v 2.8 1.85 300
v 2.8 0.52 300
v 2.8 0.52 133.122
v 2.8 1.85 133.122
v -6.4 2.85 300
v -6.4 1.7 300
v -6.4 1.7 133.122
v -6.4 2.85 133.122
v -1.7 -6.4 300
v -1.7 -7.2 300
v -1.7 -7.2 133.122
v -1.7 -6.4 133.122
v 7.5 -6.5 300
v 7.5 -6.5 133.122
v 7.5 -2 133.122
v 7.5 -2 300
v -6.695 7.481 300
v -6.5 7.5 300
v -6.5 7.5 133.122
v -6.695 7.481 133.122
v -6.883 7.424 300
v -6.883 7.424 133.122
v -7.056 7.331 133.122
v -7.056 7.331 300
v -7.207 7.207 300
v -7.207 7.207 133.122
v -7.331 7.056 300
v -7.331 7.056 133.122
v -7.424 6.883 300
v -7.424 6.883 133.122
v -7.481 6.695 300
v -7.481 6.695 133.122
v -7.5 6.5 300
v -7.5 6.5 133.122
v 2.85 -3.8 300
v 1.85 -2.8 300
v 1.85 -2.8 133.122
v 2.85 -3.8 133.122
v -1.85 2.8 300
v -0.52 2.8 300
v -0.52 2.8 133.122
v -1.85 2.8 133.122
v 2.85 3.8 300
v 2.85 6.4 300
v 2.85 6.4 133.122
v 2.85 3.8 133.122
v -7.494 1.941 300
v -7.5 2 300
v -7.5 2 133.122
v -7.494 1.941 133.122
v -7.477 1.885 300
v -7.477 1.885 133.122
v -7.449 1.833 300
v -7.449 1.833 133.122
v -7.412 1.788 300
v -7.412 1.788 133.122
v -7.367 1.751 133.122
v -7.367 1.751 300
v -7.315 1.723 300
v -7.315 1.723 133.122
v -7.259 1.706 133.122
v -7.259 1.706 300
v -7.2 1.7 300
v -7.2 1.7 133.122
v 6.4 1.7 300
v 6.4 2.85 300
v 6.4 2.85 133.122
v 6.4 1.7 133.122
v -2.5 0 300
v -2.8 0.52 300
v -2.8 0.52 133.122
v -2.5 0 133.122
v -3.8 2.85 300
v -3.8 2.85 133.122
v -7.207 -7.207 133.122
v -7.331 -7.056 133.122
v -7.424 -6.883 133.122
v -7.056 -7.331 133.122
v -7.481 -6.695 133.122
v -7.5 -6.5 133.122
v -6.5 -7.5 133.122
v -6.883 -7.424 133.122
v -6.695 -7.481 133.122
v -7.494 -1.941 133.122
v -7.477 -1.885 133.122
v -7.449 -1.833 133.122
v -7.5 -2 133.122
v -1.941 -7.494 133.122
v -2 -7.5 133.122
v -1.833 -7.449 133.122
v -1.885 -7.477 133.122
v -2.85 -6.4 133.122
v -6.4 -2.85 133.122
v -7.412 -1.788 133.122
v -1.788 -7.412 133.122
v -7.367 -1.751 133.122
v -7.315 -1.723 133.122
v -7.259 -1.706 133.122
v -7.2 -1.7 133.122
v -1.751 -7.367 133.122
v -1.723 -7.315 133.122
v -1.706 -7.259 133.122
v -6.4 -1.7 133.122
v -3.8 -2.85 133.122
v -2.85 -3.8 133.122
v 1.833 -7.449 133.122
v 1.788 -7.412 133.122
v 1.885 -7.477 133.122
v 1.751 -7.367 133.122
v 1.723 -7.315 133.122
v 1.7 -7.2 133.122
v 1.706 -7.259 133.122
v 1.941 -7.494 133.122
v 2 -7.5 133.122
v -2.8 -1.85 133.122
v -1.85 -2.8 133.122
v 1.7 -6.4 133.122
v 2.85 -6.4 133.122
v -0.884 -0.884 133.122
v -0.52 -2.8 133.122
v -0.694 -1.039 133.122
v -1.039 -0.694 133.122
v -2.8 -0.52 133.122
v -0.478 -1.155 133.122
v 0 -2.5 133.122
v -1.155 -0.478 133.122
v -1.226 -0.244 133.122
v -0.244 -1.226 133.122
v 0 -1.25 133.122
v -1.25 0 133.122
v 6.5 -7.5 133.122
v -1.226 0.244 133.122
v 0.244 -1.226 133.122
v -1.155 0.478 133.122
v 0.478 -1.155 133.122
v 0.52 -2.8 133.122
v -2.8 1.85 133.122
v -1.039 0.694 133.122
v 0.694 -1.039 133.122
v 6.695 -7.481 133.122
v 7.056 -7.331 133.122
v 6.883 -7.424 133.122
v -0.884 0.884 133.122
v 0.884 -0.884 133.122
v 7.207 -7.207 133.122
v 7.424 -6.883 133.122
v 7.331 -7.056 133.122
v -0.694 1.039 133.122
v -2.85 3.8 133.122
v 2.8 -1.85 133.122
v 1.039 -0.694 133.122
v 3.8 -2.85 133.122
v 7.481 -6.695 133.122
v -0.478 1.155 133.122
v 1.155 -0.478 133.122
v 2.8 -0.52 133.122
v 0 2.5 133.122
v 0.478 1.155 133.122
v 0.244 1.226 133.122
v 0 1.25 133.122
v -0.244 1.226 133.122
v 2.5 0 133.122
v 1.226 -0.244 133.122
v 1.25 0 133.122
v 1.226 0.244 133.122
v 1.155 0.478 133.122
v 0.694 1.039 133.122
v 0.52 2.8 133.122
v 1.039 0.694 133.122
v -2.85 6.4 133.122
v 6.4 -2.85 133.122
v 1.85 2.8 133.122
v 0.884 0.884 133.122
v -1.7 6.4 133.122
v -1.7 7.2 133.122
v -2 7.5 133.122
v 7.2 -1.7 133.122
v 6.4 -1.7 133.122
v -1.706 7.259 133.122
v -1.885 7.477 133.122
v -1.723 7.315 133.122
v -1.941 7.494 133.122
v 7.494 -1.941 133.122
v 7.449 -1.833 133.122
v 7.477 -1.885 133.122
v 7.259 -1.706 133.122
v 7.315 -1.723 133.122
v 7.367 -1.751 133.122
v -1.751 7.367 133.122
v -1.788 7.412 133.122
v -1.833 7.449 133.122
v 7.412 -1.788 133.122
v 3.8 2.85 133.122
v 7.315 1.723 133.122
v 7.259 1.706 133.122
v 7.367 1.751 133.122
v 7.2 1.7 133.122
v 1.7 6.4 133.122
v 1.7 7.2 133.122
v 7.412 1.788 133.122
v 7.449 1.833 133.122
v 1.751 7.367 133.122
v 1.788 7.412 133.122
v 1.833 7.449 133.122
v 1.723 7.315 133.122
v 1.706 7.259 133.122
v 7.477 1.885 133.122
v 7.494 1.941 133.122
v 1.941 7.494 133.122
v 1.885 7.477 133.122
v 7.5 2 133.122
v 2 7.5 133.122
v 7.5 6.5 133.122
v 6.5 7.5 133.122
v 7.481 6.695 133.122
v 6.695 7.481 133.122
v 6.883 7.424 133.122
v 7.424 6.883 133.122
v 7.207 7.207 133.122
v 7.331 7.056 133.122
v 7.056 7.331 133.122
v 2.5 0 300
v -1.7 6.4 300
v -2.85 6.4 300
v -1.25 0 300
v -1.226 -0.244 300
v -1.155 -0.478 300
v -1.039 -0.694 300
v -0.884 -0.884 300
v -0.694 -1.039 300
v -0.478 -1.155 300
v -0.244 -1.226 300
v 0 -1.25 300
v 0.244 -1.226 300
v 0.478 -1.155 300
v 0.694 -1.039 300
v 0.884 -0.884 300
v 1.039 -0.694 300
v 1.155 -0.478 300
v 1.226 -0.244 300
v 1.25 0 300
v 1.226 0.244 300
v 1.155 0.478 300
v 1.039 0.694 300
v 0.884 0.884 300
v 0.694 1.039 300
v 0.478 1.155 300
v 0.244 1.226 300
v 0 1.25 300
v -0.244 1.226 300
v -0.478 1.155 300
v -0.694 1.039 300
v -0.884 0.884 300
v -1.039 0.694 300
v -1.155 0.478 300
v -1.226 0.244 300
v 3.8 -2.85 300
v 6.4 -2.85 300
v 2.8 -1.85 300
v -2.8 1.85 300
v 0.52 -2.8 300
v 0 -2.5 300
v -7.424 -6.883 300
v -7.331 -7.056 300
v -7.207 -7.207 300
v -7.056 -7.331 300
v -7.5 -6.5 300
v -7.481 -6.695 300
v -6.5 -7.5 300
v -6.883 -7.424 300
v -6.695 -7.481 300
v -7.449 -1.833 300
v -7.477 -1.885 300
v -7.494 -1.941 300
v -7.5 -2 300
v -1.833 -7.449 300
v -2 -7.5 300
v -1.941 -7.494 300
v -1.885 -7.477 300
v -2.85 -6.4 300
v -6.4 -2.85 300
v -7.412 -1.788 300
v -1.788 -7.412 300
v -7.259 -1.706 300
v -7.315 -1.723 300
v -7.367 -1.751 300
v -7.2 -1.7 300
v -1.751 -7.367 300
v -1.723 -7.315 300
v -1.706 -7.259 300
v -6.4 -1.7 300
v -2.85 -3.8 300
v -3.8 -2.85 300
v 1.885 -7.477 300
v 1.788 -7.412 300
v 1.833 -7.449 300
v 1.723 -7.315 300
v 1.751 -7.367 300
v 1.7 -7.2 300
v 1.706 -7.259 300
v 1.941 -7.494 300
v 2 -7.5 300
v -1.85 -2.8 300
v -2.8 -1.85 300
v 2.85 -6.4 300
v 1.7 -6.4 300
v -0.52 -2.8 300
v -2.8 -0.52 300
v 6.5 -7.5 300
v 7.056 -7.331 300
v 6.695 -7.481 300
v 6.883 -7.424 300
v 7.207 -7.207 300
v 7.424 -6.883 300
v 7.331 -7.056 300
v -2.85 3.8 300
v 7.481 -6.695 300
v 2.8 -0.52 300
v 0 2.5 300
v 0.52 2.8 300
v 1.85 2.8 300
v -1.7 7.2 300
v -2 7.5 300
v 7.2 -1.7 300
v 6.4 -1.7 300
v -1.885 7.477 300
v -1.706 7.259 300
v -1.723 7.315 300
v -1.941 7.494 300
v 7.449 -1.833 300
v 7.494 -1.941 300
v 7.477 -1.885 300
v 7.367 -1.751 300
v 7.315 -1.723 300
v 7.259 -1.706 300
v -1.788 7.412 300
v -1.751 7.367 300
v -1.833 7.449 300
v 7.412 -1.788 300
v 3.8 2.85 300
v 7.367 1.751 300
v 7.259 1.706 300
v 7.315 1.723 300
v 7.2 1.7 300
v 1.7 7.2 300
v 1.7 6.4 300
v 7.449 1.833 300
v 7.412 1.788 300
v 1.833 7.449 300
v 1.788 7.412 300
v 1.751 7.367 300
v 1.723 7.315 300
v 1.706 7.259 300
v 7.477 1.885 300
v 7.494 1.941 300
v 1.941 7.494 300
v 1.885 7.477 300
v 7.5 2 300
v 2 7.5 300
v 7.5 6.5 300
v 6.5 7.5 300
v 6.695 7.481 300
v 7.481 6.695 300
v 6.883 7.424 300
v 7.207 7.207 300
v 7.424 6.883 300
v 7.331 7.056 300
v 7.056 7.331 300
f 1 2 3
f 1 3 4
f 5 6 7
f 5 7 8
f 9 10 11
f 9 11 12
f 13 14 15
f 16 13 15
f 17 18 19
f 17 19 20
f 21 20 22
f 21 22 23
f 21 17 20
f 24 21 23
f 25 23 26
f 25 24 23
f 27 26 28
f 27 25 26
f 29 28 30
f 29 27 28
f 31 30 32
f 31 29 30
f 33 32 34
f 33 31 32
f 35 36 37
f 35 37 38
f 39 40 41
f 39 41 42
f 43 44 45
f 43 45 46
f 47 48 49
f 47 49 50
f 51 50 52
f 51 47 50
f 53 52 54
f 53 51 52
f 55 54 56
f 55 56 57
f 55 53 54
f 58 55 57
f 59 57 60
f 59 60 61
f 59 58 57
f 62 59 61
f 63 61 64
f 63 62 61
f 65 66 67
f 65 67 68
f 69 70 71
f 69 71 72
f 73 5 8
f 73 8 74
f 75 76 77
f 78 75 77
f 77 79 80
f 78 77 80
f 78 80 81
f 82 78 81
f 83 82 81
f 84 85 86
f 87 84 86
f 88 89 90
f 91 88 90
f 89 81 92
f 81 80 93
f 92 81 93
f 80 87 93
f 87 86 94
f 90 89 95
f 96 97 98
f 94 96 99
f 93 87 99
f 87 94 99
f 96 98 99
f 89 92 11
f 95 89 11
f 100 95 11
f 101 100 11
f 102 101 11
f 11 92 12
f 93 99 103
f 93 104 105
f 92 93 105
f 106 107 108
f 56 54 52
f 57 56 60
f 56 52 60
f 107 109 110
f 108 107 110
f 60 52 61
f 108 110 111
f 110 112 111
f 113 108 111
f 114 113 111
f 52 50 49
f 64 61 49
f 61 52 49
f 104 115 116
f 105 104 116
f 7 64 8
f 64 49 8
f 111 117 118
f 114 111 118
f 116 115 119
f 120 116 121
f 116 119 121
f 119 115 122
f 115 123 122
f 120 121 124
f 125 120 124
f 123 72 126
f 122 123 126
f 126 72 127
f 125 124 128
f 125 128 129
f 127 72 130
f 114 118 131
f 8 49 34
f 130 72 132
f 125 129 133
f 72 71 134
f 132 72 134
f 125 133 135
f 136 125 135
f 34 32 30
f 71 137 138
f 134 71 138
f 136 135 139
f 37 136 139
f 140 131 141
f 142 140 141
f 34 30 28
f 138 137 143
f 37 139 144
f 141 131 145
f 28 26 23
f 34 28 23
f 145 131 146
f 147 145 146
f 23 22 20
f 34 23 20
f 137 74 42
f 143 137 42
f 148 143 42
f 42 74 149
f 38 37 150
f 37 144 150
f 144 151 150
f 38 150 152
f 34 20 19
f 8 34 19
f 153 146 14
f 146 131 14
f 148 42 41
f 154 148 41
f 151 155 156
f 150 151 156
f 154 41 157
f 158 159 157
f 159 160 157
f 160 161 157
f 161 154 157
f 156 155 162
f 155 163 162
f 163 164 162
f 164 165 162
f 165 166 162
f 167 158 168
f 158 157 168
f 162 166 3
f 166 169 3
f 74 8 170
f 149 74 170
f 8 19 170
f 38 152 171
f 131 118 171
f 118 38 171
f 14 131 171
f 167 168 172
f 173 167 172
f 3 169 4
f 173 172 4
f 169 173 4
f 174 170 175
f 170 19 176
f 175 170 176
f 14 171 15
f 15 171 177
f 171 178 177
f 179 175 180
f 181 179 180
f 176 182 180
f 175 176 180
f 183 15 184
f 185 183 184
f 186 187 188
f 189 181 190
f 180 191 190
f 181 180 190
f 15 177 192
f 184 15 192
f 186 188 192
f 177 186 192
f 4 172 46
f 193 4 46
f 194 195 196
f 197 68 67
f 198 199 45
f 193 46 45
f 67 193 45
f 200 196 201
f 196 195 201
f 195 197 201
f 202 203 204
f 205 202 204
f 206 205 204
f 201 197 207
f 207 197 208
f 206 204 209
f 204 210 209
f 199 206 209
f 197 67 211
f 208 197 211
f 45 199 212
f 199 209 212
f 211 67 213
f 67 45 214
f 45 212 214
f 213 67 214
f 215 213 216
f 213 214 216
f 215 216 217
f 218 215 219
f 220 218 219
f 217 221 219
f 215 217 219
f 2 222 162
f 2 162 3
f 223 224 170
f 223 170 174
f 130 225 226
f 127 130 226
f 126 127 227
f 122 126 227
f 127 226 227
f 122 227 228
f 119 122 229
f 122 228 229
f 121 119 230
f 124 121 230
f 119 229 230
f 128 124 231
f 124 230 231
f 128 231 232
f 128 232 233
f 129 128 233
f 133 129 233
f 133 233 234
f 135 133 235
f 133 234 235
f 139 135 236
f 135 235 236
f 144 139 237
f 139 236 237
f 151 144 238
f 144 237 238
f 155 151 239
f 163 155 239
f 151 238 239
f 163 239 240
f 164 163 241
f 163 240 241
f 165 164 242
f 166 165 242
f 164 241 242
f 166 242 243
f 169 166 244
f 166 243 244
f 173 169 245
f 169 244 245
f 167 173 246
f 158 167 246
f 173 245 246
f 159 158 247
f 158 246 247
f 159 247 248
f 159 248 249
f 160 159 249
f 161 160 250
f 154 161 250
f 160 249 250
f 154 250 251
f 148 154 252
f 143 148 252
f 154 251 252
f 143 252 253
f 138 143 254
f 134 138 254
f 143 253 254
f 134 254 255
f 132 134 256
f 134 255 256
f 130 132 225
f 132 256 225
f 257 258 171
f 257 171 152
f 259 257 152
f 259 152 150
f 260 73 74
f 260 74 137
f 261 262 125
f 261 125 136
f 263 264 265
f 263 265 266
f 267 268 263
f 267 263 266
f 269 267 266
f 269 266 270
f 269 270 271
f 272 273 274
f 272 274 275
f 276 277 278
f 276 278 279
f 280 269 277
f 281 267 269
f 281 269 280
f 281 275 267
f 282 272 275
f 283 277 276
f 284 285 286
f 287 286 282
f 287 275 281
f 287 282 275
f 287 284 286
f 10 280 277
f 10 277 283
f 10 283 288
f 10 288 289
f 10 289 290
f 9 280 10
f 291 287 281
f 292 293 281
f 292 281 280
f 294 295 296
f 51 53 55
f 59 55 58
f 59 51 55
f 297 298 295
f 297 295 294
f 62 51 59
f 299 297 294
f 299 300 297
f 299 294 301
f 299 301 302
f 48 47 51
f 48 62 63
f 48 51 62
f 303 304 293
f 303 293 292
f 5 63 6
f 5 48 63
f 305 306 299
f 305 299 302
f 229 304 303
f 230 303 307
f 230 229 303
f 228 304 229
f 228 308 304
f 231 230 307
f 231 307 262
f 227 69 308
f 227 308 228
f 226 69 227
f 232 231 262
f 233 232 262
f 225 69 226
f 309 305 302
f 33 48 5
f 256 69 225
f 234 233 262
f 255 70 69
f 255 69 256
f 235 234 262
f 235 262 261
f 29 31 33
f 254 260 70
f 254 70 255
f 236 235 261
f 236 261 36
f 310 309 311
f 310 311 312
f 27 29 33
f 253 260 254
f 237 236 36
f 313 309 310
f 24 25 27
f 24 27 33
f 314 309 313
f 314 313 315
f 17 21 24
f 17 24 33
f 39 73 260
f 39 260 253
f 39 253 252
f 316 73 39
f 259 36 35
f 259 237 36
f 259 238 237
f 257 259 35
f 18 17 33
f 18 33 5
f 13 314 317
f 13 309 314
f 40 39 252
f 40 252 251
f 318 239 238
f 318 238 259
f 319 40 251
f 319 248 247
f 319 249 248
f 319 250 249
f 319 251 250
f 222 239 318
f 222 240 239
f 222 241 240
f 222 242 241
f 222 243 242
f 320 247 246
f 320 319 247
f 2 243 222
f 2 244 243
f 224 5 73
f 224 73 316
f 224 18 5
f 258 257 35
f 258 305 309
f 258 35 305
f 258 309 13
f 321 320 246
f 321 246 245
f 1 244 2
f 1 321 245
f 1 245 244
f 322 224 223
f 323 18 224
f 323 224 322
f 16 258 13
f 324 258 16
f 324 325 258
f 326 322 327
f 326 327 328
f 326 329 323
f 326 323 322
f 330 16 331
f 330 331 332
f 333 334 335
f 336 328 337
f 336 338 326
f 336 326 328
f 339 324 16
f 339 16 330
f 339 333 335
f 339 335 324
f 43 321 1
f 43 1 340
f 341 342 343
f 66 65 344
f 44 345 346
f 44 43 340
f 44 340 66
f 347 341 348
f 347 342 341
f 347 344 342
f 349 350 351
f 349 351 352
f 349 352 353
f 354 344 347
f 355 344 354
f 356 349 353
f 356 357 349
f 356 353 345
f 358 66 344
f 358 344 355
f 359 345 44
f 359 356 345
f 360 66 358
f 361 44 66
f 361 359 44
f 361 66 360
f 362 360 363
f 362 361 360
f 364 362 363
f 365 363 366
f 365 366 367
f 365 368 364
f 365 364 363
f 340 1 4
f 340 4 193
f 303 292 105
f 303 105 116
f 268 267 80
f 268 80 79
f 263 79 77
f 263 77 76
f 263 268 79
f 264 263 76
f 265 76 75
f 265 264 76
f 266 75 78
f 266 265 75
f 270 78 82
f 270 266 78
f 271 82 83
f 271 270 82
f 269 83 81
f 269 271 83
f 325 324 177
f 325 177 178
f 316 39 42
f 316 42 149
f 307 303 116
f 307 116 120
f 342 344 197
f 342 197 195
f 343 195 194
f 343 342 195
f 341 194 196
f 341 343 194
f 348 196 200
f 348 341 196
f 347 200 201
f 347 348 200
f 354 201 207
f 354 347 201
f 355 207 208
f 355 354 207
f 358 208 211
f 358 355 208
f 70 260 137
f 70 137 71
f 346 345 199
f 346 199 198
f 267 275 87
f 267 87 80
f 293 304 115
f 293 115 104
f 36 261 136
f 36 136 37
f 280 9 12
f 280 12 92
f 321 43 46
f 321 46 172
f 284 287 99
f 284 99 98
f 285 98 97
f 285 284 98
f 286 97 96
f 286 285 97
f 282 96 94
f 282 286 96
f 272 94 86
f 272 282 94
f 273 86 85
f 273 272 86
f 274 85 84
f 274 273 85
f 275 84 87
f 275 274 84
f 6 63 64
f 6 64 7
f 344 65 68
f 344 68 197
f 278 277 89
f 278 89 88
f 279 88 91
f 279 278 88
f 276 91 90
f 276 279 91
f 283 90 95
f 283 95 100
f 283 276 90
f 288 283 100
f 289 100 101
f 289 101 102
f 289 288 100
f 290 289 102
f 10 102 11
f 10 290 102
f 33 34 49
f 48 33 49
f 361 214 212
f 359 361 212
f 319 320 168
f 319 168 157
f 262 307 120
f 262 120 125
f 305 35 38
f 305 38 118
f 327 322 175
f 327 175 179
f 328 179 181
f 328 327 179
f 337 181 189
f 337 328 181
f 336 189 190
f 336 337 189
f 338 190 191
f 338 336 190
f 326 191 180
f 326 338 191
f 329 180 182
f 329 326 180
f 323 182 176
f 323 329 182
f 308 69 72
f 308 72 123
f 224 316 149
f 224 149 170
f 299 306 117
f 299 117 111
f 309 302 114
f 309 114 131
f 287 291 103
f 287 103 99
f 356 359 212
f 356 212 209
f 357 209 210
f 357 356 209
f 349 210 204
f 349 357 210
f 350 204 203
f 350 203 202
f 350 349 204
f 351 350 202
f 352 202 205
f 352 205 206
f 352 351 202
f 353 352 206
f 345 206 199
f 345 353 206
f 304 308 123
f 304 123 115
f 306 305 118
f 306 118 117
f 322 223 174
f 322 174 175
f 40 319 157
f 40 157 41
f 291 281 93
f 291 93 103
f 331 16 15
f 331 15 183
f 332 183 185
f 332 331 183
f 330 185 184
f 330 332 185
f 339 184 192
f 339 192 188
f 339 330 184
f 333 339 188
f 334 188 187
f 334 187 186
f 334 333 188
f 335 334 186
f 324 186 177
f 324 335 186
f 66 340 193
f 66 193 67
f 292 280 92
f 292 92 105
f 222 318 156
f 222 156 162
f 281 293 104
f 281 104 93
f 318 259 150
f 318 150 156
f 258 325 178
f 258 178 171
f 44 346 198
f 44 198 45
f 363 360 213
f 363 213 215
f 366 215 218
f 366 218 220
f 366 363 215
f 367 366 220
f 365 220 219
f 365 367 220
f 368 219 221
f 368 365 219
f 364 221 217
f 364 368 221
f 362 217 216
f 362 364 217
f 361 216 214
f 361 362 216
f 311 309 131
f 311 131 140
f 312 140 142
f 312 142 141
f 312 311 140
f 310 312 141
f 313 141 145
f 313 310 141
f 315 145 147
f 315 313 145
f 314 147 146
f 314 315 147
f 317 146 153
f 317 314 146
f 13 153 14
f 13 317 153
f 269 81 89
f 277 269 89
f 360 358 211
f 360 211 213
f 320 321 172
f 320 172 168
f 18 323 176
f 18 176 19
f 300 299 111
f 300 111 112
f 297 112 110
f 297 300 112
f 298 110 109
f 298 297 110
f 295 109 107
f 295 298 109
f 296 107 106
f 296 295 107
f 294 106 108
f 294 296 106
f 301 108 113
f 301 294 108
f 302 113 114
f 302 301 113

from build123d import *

# Parameters (mm, degrees)
SKETCH1_R           = 1.25
BOSS_EXTRUDE1_DEPTH = 166.878


with BuildPart() as part:
    # Sketch1 → Boss-Extrude1 (new body)
    with BuildSketch(Plane.XY.offset(300)):
        with BuildLine():
            Line((-7.5, 6.5), (-7.5, 2))
            ThreePointArc((-7.5, 2), (-7.412132034, 1.787867966), (-7.2, 1.7))
            Line((-7.2, 1.7), (-6.4, 1.7))
            Line((-6.4, 1.7), (-6.4, 2.85))
            Line((-6.4, 2.85), (-3.8, 2.85))
            Line((-3.8, 2.85), (-2.8, 1.85))
            Line((-2.8, 1.85), (-2.8, 0.519615242))
            Line((-2.8, 0.519615242), (-2.5, 0))
            Line((-2.5, 0), (-2.8, -0.519615242))
            Line((-2.8, -0.519615242), (-2.8, -1.85))
            Line((-2.8, -1.85), (-3.8, -2.85))
            Line((-3.8, -2.85), (-6.4, -2.85))
            Line((-6.4, -2.85), (-6.4, -1.7))
            Line((-6.4, -1.7), (-7.2, -1.7))
            ThreePointArc((-7.2, -1.7), (-7.412132034, -1.787867966), (-7.5, -2))
            Line((-7.5, -2), (-7.5, -6.5))
            ThreePointArc((-7.5, -6.5), (-7.207106781, -7.207106781), (-6.5, -7.5))
            Line((-6.5, -7.5), (-2, -7.5))
            ThreePointArc((-2, -7.5), (-1.787867966, -7.412132034), (-1.7, -7.2))
            Line((-1.7, -7.2), (-1.7, -6.4))
            Line((-1.7, -6.4), (-2.85, -6.4))
            Line((-2.85, -6.4), (-2.85, -3.8))
            Line((-2.85, -3.8), (-1.85, -2.8))
            Line((-1.85, -2.8), (-0.519615242, -2.8))
            Line((-0.519615242, -2.8), (0, -2.5))
            Line((0, -2.5), (0.519615242, -2.8))
            Line((0.519615242, -2.8), (1.85, -2.8))
            Line((1.85, -2.8), (2.85, -3.8))
            Line((2.85, -3.8), (2.85, -6.4))
            Line((2.85, -6.4), (1.7, -6.4))
            Line((1.7, -6.4), (1.7, -7.2))
            ThreePointArc((1.7, -7.2), (1.787867966, -7.412132034), (2, -7.5))
            Line((2, -7.5), (6.5, -7.5))
            ThreePointArc((6.5, -7.5), (7.207106781, -7.207106781), (7.5, -6.5))
            Line((7.5, -6.5), (7.5, -2))
            ThreePointArc((7.5, -2), (7.412132034, -1.787867966), (7.2, -1.7))
            Line((7.2, -1.7), (6.4, -1.7))
            Line((6.4, -1.7), (6.4, -2.85))
            Line((6.4, -2.85), (3.8, -2.85))
            Line((3.8, -2.85), (2.8, -1.85))
            Line((2.8, -1.85), (2.8, -0.519615242))
            Line((2.8, -0.519615242), (2.5, 0))
            Line((2.5, 0), (2.8, 0.519615242))
            Line((2.8, 0.519615242), (2.8, 1.85))
            Line((2.8, 1.85), (3.8, 2.85))
            Line((3.8, 2.85), (6.4, 2.85))
            Line((6.4, 2.85), (6.4, 1.7))
            Line((6.4, 1.7), (7.2, 1.7))
            ThreePointArc((7.2, 1.7), (7.412132034, 1.787867966), (7.5, 2))
            Line((7.5, 2), (7.5, 6.5))
            ThreePointArc((7.5, 6.5), (7.207106781, 7.207106781), (6.5, 7.5))
            Line((6.5, 7.5), (2, 7.5))
            ThreePointArc((2, 7.5), (1.787867966, 7.412132034), (1.7, 7.2))
            Line((1.7, 7.2), (1.7, 6.4))
            Line((1.7, 6.4), (2.85, 6.4))
            Line((2.85, 6.4), (2.85, 3.8))
            Line((2.85, 3.8), (1.85, 2.8))
            Line((1.85, 2.8), (0.519615242, 2.8))
            Line((0.519615242, 2.8), (0, 2.5))
            Line((0, 2.5), (-0.519615242, 2.8))
            Line((-0.519615242, 2.8), (-1.85, 2.8))
            Line((-1.85, 2.8), (-2.85, 3.8))
            Line((-2.85, 3.8), (-2.85, 6.4))
            Line((-2.85, 6.4), (-1.7, 6.4))
            Line((-1.7, 6.4), (-1.7, 7.2))
            ThreePointArc((-1.7, 7.2), (-1.787867966, 7.412132034), (-2, 7.5))
            Line((-2, 7.5), (-6.5, 7.5))
            ThreePointArc((-6.5, 7.5), (-7.207106781, 7.207106781), (-7.5, 6.5))
        make_face()
        with Locations(Location((0, 0, 0), (0, 0, 180))):
            Circle(SKETCH1_R, mode=Mode.SUBTRACT)
    extrude(amount=-BOSS_EXTRUDE1_DEPTH)


solid = part.part
